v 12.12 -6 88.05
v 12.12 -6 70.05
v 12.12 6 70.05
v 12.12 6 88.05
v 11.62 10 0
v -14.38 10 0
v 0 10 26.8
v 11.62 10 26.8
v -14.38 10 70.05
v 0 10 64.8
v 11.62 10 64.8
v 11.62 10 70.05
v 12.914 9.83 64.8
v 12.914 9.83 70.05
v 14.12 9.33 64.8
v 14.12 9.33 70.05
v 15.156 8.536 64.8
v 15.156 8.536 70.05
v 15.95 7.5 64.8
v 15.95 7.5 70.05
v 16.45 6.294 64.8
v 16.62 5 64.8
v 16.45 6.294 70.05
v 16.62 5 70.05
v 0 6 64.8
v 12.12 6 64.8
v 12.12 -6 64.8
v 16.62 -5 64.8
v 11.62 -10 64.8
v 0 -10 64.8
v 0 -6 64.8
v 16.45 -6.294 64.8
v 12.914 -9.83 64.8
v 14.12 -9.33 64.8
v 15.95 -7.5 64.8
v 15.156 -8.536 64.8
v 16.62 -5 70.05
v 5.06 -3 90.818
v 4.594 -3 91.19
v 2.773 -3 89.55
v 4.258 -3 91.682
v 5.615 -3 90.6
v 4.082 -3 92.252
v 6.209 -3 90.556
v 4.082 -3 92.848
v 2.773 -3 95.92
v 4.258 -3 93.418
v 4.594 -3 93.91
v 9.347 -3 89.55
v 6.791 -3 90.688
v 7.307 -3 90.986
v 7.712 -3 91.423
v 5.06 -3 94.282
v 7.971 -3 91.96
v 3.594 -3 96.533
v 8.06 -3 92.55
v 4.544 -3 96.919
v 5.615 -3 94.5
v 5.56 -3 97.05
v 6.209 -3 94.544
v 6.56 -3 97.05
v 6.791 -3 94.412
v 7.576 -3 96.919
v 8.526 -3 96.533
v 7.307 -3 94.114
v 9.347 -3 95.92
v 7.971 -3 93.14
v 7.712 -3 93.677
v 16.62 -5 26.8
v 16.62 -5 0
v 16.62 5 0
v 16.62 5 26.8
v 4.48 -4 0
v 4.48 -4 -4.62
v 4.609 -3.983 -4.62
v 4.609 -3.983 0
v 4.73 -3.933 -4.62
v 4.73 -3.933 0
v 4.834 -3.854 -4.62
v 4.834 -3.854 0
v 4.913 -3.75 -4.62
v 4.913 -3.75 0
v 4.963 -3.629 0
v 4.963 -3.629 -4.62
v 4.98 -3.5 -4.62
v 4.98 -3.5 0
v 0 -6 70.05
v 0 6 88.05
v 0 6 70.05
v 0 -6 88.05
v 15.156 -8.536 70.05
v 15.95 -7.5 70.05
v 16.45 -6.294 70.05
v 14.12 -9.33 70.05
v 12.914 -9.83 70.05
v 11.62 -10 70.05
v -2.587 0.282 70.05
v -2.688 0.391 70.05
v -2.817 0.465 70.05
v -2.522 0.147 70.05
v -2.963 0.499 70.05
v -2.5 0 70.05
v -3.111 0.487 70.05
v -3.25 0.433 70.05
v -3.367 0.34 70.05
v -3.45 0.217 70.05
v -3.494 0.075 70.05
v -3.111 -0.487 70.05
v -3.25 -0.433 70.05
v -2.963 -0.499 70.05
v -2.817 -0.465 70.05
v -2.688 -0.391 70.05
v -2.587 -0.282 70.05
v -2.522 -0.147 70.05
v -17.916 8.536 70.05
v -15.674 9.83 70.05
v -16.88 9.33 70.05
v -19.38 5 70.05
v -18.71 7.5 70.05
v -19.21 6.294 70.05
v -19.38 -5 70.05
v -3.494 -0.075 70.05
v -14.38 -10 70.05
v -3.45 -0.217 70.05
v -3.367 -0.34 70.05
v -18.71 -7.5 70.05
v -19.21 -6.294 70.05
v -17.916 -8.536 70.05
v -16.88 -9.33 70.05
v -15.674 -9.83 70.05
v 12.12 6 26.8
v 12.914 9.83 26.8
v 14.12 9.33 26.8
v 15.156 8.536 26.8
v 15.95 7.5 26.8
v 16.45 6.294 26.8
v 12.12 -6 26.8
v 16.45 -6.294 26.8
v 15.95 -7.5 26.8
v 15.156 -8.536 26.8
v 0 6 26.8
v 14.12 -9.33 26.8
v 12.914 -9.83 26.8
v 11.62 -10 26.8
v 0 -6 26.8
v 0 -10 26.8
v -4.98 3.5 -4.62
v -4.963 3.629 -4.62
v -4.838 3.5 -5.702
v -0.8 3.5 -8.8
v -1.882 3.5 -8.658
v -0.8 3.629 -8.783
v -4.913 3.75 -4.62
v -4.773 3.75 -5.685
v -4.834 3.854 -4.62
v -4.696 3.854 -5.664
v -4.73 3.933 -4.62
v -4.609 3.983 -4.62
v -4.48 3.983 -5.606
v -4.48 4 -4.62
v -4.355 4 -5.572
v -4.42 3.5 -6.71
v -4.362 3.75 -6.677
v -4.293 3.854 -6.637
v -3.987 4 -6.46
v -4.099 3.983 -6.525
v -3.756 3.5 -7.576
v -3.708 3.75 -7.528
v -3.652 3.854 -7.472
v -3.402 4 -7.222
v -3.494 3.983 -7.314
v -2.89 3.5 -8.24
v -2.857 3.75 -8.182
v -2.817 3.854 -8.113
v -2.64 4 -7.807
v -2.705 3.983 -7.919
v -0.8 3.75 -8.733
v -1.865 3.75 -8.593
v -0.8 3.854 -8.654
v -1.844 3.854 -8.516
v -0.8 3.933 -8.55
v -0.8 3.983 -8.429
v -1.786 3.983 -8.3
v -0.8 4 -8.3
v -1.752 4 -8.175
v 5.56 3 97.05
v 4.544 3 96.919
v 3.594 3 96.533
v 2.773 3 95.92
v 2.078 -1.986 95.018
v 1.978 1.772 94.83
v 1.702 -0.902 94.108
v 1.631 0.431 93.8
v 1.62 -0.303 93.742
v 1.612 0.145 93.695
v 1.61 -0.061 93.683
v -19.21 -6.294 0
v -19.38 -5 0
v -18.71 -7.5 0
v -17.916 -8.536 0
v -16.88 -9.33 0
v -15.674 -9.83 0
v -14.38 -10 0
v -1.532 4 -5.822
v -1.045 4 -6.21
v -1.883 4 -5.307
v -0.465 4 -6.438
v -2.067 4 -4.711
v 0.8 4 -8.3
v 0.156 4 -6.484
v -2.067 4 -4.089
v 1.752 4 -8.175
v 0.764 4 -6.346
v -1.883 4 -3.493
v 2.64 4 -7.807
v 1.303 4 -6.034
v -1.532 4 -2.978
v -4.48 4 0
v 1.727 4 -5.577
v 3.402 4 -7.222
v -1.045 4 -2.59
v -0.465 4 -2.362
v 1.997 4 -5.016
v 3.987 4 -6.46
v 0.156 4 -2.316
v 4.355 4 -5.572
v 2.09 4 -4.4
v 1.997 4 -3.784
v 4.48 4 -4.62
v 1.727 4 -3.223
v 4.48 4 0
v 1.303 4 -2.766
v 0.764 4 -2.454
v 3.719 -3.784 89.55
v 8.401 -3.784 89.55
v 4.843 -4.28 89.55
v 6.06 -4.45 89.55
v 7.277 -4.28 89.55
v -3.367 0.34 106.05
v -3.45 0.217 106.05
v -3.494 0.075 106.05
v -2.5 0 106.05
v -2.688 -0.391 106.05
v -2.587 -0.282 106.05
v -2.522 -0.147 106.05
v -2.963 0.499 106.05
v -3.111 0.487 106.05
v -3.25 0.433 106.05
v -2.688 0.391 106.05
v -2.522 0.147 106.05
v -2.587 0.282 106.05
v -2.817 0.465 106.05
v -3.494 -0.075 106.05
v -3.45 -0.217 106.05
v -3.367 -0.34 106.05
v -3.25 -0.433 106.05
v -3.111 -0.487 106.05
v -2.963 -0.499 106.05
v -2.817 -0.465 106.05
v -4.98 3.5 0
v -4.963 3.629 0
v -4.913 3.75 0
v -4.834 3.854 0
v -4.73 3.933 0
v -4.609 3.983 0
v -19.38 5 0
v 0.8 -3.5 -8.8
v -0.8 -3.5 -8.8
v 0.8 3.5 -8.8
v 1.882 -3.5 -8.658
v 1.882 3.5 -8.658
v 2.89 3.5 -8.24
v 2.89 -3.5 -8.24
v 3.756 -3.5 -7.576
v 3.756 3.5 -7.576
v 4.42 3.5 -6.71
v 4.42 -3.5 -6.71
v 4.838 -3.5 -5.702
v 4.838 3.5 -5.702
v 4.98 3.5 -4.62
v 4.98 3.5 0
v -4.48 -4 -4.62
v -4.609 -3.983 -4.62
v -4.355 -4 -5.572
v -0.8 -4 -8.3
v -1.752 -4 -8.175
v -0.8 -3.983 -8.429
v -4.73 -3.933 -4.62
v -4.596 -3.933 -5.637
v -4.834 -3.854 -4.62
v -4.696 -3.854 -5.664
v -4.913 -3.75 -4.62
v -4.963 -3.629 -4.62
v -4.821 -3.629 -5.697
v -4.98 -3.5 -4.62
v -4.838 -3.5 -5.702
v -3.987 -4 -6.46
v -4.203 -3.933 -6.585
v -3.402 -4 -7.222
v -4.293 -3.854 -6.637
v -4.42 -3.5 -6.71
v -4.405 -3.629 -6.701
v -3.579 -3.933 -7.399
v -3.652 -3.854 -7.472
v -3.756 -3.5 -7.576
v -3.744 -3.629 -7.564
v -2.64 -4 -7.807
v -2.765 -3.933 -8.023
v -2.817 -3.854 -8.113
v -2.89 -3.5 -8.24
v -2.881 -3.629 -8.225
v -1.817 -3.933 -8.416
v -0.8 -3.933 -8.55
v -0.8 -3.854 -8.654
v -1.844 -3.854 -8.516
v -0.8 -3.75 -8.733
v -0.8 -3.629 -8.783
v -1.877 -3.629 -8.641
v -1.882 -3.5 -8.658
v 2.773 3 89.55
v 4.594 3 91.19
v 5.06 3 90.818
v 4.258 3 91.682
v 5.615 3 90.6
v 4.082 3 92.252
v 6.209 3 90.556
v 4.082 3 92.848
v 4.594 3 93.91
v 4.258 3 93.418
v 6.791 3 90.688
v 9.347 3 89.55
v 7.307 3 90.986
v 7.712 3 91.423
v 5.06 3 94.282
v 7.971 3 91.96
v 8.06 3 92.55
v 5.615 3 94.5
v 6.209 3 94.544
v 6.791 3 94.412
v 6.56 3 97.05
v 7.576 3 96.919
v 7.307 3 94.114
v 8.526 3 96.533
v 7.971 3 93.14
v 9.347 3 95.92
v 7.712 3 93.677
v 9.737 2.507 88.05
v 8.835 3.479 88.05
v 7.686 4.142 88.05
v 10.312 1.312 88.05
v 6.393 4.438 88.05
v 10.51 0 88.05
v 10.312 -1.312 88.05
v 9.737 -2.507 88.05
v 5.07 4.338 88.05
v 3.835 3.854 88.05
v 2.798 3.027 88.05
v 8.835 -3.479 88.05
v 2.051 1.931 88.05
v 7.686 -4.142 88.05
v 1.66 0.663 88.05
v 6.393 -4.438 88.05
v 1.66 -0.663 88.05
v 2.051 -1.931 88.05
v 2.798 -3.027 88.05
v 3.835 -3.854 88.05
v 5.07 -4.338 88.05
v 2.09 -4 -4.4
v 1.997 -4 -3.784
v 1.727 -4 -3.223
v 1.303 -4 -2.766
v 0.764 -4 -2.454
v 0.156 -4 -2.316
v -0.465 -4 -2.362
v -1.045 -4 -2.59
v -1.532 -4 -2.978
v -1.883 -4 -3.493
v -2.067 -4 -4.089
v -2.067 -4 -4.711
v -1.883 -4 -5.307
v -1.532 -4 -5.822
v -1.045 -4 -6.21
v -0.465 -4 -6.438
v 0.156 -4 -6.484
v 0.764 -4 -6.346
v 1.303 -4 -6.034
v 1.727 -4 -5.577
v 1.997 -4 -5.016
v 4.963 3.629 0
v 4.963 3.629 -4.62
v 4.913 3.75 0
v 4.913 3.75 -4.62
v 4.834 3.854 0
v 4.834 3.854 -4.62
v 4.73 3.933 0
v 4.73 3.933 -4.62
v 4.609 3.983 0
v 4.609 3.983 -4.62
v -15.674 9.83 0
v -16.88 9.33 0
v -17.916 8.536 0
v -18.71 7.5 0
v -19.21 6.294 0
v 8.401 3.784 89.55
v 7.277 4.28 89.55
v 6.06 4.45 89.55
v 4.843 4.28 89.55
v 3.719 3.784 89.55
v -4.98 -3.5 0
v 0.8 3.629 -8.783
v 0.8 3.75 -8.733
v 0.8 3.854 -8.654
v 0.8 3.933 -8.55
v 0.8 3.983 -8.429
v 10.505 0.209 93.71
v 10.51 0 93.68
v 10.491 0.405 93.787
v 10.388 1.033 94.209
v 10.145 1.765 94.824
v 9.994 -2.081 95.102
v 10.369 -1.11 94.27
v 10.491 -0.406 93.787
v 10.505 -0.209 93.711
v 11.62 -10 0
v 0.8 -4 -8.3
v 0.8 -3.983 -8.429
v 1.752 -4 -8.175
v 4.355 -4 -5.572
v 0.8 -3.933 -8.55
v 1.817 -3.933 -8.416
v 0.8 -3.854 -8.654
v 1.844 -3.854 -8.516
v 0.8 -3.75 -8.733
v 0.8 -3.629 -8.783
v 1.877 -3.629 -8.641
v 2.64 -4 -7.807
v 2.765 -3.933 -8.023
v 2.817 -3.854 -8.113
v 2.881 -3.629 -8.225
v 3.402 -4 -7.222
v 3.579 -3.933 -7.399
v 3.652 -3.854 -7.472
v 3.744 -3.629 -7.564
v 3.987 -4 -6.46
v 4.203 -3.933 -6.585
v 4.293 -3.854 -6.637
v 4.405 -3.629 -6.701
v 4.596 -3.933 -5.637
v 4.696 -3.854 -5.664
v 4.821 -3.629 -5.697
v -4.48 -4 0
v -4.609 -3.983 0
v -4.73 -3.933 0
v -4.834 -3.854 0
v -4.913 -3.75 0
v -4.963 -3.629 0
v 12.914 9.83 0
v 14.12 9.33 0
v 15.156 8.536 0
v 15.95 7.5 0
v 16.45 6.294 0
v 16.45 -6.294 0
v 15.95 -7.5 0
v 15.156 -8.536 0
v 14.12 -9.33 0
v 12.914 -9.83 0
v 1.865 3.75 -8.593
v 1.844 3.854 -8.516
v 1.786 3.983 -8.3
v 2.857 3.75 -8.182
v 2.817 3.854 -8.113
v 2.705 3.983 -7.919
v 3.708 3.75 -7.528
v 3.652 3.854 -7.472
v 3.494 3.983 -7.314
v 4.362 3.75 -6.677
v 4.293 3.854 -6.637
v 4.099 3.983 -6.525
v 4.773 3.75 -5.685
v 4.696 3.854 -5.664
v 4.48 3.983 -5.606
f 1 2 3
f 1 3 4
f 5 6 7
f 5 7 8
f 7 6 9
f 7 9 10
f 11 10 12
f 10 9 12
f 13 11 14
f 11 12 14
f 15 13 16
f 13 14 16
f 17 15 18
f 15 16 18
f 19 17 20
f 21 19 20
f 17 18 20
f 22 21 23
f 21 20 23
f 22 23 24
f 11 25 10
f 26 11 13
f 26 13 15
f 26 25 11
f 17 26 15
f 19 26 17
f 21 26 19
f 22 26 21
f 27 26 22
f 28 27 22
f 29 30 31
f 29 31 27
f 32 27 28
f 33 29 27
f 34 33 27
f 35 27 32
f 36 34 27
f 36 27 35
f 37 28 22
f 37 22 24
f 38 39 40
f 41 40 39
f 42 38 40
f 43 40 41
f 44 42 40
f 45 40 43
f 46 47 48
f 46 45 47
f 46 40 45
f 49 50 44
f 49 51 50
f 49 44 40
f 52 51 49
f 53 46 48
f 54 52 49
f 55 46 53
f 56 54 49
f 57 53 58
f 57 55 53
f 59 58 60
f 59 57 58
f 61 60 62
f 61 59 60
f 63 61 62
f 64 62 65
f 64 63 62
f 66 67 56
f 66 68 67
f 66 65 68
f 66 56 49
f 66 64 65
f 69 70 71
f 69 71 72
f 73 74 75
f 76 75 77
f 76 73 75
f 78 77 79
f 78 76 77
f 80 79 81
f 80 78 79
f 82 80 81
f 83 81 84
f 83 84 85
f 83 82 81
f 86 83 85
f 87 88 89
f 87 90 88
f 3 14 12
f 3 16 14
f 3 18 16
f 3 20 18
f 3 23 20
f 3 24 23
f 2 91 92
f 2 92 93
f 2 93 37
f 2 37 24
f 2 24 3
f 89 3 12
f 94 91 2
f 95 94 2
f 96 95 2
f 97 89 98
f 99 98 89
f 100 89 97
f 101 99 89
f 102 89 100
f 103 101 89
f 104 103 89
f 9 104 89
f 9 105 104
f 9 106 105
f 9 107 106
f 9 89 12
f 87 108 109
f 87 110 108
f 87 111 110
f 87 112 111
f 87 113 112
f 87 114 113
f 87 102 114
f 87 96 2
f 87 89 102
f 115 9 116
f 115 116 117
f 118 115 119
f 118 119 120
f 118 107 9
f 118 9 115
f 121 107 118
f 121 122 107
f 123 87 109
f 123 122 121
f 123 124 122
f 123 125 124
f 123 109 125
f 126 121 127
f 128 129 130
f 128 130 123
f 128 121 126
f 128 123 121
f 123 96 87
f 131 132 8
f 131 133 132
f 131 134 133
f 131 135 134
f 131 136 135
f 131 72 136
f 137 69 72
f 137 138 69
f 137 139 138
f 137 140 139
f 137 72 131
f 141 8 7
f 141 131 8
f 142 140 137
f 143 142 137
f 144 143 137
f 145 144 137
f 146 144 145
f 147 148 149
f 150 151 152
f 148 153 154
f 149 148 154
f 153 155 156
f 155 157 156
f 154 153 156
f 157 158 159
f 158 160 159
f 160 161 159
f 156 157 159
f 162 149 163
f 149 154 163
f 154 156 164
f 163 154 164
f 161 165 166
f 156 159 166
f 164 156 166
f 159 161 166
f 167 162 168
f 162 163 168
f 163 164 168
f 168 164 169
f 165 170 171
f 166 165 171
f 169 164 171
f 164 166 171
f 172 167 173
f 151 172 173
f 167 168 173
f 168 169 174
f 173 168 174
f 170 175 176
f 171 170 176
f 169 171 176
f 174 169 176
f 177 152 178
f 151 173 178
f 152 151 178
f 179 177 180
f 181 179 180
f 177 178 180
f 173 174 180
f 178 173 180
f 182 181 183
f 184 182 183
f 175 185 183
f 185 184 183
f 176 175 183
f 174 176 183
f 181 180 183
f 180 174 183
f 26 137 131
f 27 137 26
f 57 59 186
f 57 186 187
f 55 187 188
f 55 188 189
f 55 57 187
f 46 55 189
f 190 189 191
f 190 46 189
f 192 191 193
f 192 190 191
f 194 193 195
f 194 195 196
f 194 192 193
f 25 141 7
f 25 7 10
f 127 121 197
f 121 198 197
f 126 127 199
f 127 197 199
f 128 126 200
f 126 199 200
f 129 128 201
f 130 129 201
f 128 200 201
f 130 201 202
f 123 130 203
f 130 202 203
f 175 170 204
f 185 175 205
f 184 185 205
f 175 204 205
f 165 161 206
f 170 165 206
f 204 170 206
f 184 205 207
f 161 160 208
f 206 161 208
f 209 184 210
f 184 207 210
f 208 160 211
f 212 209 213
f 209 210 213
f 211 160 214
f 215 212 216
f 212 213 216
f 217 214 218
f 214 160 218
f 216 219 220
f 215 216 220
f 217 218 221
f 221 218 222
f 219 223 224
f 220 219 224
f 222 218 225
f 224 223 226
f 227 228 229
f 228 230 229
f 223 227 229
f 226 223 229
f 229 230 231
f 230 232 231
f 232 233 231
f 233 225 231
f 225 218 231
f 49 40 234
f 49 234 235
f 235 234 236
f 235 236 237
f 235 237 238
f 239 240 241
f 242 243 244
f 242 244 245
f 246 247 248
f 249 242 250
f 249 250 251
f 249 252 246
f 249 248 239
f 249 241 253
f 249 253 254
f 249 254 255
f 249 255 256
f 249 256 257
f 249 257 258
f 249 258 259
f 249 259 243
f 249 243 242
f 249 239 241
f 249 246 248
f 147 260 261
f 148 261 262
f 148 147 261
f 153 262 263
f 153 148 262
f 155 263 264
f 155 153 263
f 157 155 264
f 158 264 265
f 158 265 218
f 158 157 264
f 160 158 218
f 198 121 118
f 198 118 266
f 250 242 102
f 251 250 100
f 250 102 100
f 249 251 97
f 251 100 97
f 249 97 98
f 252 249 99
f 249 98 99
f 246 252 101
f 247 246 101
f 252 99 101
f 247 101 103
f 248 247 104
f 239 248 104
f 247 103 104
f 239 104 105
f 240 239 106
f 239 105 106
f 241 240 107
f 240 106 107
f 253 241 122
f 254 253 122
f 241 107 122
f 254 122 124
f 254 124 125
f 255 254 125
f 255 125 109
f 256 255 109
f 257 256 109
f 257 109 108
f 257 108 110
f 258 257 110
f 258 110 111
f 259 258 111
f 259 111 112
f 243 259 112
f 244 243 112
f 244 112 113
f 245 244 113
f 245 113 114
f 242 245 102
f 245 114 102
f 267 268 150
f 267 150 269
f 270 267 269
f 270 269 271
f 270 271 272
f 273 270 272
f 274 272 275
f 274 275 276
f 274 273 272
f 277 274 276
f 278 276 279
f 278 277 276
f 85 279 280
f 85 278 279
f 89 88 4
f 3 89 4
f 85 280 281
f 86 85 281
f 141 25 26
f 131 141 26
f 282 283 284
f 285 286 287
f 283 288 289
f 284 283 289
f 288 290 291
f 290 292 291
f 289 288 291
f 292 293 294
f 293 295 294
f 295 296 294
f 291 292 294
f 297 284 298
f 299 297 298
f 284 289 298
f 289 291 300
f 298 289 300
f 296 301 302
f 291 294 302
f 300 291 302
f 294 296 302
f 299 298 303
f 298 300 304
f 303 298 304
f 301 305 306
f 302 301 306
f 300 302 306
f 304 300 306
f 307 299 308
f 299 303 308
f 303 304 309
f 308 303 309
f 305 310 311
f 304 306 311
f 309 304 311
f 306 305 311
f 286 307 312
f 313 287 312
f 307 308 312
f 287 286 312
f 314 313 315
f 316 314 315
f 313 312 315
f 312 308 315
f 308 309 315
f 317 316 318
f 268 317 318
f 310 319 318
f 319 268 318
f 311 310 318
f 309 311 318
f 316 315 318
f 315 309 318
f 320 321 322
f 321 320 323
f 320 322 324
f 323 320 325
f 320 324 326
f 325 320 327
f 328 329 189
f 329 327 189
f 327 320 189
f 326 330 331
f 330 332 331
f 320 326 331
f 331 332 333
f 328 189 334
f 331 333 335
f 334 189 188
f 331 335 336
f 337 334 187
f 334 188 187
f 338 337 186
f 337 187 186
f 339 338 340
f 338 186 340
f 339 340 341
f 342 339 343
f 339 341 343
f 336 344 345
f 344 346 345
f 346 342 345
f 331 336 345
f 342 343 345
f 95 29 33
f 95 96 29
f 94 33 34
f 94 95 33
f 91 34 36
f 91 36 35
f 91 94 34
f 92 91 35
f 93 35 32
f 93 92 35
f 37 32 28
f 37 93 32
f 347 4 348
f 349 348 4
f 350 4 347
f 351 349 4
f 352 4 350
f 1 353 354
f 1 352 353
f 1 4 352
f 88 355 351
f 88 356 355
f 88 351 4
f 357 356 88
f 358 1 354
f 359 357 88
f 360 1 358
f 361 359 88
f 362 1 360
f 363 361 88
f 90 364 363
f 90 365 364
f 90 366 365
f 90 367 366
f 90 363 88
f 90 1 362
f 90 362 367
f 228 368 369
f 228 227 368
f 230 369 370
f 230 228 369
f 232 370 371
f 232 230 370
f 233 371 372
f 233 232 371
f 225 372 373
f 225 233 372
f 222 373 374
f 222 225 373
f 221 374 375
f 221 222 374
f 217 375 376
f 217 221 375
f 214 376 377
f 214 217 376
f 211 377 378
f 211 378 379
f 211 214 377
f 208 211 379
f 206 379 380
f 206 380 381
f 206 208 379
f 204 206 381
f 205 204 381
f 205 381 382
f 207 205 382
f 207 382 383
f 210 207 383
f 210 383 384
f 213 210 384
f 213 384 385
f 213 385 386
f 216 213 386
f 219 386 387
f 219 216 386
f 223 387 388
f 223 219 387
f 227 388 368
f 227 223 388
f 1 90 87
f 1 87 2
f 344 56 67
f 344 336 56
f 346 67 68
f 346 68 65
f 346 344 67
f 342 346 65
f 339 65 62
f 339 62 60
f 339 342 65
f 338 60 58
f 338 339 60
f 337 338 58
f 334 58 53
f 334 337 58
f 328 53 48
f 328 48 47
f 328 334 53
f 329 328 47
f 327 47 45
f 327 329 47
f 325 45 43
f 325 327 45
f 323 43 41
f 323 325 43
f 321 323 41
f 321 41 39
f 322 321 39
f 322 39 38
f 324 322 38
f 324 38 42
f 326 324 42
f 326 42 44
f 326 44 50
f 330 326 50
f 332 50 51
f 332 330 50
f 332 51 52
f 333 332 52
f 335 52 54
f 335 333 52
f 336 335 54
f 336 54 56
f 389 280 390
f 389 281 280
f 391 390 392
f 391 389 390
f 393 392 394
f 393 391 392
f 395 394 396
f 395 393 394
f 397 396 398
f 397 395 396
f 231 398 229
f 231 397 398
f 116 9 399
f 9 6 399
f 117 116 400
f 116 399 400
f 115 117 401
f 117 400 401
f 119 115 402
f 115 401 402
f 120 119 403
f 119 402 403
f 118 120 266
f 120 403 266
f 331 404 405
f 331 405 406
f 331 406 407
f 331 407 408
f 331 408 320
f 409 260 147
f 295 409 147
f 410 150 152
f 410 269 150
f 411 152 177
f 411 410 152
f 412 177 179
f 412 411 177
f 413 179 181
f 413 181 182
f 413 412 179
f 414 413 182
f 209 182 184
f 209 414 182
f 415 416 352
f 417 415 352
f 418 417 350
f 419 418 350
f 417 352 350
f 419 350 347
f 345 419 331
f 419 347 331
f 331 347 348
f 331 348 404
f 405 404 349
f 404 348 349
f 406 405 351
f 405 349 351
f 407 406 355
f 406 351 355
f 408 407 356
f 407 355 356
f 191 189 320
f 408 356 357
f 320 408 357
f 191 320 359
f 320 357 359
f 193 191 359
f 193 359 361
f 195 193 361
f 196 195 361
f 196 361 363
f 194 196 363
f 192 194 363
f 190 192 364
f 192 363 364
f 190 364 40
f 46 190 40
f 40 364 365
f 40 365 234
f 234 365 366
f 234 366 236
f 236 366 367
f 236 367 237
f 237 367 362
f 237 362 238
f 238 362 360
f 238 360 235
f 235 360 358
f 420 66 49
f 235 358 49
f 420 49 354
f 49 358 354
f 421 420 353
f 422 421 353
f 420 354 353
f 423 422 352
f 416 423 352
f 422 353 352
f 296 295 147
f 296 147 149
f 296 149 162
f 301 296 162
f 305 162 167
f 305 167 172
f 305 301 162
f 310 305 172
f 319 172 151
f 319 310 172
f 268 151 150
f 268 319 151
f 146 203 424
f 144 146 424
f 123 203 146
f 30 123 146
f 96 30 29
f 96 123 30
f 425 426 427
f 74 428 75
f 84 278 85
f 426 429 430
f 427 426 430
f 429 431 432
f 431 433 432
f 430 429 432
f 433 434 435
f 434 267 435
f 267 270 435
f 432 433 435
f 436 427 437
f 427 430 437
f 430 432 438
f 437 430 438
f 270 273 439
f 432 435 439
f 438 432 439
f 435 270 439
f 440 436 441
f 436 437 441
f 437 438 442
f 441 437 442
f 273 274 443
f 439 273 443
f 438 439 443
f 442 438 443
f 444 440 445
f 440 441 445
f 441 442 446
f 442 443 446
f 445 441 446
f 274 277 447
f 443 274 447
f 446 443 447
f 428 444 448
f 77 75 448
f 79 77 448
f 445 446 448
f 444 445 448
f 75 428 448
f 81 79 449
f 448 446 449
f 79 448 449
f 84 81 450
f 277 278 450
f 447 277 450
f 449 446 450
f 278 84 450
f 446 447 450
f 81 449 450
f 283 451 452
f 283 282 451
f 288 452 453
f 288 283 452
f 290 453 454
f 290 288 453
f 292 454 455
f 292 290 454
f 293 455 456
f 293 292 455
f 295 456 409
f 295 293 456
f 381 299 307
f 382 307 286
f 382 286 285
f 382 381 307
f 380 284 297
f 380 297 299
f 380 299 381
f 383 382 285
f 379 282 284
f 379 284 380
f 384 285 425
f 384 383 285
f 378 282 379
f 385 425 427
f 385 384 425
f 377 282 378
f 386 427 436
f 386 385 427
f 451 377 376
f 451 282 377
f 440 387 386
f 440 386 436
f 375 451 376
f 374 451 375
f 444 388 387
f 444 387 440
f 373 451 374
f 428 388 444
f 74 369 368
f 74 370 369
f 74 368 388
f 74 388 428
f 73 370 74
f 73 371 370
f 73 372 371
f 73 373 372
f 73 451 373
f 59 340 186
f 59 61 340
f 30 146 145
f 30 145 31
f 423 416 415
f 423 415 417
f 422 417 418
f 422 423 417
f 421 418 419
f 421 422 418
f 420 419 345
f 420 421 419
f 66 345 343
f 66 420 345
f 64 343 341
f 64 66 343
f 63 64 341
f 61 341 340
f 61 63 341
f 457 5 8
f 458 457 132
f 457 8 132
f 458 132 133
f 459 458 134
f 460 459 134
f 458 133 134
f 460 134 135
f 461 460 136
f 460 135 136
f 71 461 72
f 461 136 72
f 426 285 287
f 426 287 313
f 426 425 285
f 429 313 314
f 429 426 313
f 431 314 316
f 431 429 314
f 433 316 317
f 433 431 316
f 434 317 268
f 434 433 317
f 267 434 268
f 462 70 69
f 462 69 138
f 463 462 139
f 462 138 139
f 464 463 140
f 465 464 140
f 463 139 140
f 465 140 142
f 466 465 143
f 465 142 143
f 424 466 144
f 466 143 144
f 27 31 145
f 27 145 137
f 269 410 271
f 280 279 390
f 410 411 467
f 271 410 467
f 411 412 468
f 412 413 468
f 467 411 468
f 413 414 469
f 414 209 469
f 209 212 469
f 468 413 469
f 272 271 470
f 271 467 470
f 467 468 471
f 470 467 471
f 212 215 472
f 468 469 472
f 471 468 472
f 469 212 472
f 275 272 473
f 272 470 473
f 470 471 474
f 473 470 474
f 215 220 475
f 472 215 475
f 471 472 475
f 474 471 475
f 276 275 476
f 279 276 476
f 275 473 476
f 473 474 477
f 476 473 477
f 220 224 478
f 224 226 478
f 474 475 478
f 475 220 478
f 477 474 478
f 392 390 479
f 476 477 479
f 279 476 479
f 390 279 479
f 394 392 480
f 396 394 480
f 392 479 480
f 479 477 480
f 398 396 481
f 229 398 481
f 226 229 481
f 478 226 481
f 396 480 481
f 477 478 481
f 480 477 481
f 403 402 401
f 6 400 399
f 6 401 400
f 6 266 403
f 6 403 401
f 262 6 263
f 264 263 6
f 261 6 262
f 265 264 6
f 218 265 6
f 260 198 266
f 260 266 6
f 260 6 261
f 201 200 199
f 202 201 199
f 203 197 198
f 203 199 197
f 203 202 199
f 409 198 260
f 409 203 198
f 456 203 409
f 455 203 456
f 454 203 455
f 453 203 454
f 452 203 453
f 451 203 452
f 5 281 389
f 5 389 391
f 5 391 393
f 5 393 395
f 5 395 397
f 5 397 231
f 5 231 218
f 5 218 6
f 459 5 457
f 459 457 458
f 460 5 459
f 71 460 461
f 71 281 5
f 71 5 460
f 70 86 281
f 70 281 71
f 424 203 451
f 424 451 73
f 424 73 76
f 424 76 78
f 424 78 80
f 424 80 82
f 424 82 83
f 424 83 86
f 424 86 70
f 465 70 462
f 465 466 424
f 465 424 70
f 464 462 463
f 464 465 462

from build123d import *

# Parameters (mm, degrees)
F1_DEPTH  = 10
F0_R      = 2.09
F2_DEPTH  = 4
F3_DEPTH  = 6
F0_W      = 12.12
F0_H      = 38
F4_DEPTH  = 6
F6_R      = 0.5
F7_DEPTH  = 36
F8_R      = 5
F10_R     = 4.45
F11_DEPTH = 1.5
F0_R_2    = 2
F12_DEPTH = 3
F13_DEPTH = 25
F14_R     = 0.5


with BuildPart() as f1:
    # F0 (on Front) → F1 (new body, symmetric)
    with BuildSketch(Plane.XZ):
        Polygon((-19.38, 0), (-4.98, 0), (0, 0), (4.98, 0), (16.62, 0), (16.62, 26.8), (12.12, 26.8), (0, 26.8), (0, 64.8), (12.12, 64.8), (16.62, 64.8), (16.62, 70.05), (12.12, 70.05), (0, 70.05), (-3, 70.05), (-19.38, 70.05), align=None)
    extrude(amount=F1_DEPTH, both=True)

    # F0 (on Front) → F2 (join, symmetric)
    with BuildSketch(Plane.XZ):
        with BuildLine():
            Line((0, 0), (-4.98, 0))
            Line((-4.98, 0), (-4.98, -4.62))
            ThreePointArc((-4.98, -4.62), (-3.7557063454, -7.5757063454), (-0.8, -8.8))
            Line((-0.8, -8.8), (0.8, -8.8))
            ThreePointArc((0.8, -8.8), (3.7557063454, -7.5757063454), (4.98, -4.62))
            Line((4.98, -4.62), (4.98, 0))
            Line((4.98, 0), (0, 0))
        make_face()
        with Locations((0, -4.4)):
            Circle(F0_R, mode=Mode.SUBTRACT)
    extrude(amount=F2_DEPTH, both=True)

    # F0 (on Front) → F3 (join, symmetric)
    with BuildSketch(Plane.XZ):
        Polygon((0, 88.05), (0, 70.05), (12.12, 70.05), (12.12, 88.05), (10.56, 88.05), (1.56, 88.05), align=None)
    extrude(amount=F3_DEPTH, both=True)

    # F0 (on Front) → F4 (join, symmetric)
    with BuildSketch(Plane.XZ):
        with Locations((6.06, 45.8)):
            Rectangle(F0_W, F0_H)
    extrude(amount=F4_DEPTH, both=True)

    # F6 (on plane+point) → F7 (join)
    with BuildSketch(Plane.XY.offset(70.05)):
        with Locations((-3, 0)):
            Circle(F6_R)
    extrude(amount=F7_DEPTH)

    # F8
    f8_edges = [f1.edges().sort_by_distance(p)[0] for p in [
        (-19.38, 10, 35.025),
        (-19.38, -10, 35.025),
        (16.62, 10, 13.4),
        (16.62, -10, 13.4),
        (16.62, 10, 67.425),
        (16.62, -10, 67.425),
    ]]
    fillet(f8_edges, radius=F8_R)

    # F10 (on offset) → F11 (join)
    with BuildSketch(Plane.XY.offset(88.05)):
        with Locations((6.06, 0)):
            Circle(F10_R)
    extrude(amount=F11_DEPTH)

    # F0 (on Front) → F12 (join, symmetric)
    with BuildSketch(Plane.XZ):
        with BuildLine():
            Line((1.56, 93.05), (1.56, 89.55))
            Line((1.56, 89.55), (10.56, 89.55))
            Line((10.56, 89.55), (10.56, 93.05))
            ThreePointArc((10.56, 93.05), (9.3884271247, 95.8784271247), (6.56, 97.05))
            Line((6.56, 97.05), (5.56, 97.05))
            ThreePointArc((5.56, 97.05), (2.7315728753, 95.8784271247), (1.56, 93.05))
        make_face()
        with Locations((6.06, 92.55)):
            Circle(F0_R_2, mode=Mode.SUBTRACT)
    extrude(amount=F12_DEPTH, both=True)

    # F13 (cut): a face of the model
    f13_faces = [f1.faces().sort_by_distance(p)[0] for p in [
        (0.1705562664, 0, 88.05),
    ]]
    extrude(f13_faces, amount=F13_DEPTH, mode=Mode.SUBTRACT)

    # F14
    f14_edges = [f1.edges().sort_by_distance(p)[0] for p in [
        (4.98, -4, -2.31),
        (4.98, 4, -2.31),
        (-4.98, -4, -2.31),
        (-4.98, 4, -2.31),
    ]]
    fillet(f14_edges, radius=F14_R)


solid = f1.part
